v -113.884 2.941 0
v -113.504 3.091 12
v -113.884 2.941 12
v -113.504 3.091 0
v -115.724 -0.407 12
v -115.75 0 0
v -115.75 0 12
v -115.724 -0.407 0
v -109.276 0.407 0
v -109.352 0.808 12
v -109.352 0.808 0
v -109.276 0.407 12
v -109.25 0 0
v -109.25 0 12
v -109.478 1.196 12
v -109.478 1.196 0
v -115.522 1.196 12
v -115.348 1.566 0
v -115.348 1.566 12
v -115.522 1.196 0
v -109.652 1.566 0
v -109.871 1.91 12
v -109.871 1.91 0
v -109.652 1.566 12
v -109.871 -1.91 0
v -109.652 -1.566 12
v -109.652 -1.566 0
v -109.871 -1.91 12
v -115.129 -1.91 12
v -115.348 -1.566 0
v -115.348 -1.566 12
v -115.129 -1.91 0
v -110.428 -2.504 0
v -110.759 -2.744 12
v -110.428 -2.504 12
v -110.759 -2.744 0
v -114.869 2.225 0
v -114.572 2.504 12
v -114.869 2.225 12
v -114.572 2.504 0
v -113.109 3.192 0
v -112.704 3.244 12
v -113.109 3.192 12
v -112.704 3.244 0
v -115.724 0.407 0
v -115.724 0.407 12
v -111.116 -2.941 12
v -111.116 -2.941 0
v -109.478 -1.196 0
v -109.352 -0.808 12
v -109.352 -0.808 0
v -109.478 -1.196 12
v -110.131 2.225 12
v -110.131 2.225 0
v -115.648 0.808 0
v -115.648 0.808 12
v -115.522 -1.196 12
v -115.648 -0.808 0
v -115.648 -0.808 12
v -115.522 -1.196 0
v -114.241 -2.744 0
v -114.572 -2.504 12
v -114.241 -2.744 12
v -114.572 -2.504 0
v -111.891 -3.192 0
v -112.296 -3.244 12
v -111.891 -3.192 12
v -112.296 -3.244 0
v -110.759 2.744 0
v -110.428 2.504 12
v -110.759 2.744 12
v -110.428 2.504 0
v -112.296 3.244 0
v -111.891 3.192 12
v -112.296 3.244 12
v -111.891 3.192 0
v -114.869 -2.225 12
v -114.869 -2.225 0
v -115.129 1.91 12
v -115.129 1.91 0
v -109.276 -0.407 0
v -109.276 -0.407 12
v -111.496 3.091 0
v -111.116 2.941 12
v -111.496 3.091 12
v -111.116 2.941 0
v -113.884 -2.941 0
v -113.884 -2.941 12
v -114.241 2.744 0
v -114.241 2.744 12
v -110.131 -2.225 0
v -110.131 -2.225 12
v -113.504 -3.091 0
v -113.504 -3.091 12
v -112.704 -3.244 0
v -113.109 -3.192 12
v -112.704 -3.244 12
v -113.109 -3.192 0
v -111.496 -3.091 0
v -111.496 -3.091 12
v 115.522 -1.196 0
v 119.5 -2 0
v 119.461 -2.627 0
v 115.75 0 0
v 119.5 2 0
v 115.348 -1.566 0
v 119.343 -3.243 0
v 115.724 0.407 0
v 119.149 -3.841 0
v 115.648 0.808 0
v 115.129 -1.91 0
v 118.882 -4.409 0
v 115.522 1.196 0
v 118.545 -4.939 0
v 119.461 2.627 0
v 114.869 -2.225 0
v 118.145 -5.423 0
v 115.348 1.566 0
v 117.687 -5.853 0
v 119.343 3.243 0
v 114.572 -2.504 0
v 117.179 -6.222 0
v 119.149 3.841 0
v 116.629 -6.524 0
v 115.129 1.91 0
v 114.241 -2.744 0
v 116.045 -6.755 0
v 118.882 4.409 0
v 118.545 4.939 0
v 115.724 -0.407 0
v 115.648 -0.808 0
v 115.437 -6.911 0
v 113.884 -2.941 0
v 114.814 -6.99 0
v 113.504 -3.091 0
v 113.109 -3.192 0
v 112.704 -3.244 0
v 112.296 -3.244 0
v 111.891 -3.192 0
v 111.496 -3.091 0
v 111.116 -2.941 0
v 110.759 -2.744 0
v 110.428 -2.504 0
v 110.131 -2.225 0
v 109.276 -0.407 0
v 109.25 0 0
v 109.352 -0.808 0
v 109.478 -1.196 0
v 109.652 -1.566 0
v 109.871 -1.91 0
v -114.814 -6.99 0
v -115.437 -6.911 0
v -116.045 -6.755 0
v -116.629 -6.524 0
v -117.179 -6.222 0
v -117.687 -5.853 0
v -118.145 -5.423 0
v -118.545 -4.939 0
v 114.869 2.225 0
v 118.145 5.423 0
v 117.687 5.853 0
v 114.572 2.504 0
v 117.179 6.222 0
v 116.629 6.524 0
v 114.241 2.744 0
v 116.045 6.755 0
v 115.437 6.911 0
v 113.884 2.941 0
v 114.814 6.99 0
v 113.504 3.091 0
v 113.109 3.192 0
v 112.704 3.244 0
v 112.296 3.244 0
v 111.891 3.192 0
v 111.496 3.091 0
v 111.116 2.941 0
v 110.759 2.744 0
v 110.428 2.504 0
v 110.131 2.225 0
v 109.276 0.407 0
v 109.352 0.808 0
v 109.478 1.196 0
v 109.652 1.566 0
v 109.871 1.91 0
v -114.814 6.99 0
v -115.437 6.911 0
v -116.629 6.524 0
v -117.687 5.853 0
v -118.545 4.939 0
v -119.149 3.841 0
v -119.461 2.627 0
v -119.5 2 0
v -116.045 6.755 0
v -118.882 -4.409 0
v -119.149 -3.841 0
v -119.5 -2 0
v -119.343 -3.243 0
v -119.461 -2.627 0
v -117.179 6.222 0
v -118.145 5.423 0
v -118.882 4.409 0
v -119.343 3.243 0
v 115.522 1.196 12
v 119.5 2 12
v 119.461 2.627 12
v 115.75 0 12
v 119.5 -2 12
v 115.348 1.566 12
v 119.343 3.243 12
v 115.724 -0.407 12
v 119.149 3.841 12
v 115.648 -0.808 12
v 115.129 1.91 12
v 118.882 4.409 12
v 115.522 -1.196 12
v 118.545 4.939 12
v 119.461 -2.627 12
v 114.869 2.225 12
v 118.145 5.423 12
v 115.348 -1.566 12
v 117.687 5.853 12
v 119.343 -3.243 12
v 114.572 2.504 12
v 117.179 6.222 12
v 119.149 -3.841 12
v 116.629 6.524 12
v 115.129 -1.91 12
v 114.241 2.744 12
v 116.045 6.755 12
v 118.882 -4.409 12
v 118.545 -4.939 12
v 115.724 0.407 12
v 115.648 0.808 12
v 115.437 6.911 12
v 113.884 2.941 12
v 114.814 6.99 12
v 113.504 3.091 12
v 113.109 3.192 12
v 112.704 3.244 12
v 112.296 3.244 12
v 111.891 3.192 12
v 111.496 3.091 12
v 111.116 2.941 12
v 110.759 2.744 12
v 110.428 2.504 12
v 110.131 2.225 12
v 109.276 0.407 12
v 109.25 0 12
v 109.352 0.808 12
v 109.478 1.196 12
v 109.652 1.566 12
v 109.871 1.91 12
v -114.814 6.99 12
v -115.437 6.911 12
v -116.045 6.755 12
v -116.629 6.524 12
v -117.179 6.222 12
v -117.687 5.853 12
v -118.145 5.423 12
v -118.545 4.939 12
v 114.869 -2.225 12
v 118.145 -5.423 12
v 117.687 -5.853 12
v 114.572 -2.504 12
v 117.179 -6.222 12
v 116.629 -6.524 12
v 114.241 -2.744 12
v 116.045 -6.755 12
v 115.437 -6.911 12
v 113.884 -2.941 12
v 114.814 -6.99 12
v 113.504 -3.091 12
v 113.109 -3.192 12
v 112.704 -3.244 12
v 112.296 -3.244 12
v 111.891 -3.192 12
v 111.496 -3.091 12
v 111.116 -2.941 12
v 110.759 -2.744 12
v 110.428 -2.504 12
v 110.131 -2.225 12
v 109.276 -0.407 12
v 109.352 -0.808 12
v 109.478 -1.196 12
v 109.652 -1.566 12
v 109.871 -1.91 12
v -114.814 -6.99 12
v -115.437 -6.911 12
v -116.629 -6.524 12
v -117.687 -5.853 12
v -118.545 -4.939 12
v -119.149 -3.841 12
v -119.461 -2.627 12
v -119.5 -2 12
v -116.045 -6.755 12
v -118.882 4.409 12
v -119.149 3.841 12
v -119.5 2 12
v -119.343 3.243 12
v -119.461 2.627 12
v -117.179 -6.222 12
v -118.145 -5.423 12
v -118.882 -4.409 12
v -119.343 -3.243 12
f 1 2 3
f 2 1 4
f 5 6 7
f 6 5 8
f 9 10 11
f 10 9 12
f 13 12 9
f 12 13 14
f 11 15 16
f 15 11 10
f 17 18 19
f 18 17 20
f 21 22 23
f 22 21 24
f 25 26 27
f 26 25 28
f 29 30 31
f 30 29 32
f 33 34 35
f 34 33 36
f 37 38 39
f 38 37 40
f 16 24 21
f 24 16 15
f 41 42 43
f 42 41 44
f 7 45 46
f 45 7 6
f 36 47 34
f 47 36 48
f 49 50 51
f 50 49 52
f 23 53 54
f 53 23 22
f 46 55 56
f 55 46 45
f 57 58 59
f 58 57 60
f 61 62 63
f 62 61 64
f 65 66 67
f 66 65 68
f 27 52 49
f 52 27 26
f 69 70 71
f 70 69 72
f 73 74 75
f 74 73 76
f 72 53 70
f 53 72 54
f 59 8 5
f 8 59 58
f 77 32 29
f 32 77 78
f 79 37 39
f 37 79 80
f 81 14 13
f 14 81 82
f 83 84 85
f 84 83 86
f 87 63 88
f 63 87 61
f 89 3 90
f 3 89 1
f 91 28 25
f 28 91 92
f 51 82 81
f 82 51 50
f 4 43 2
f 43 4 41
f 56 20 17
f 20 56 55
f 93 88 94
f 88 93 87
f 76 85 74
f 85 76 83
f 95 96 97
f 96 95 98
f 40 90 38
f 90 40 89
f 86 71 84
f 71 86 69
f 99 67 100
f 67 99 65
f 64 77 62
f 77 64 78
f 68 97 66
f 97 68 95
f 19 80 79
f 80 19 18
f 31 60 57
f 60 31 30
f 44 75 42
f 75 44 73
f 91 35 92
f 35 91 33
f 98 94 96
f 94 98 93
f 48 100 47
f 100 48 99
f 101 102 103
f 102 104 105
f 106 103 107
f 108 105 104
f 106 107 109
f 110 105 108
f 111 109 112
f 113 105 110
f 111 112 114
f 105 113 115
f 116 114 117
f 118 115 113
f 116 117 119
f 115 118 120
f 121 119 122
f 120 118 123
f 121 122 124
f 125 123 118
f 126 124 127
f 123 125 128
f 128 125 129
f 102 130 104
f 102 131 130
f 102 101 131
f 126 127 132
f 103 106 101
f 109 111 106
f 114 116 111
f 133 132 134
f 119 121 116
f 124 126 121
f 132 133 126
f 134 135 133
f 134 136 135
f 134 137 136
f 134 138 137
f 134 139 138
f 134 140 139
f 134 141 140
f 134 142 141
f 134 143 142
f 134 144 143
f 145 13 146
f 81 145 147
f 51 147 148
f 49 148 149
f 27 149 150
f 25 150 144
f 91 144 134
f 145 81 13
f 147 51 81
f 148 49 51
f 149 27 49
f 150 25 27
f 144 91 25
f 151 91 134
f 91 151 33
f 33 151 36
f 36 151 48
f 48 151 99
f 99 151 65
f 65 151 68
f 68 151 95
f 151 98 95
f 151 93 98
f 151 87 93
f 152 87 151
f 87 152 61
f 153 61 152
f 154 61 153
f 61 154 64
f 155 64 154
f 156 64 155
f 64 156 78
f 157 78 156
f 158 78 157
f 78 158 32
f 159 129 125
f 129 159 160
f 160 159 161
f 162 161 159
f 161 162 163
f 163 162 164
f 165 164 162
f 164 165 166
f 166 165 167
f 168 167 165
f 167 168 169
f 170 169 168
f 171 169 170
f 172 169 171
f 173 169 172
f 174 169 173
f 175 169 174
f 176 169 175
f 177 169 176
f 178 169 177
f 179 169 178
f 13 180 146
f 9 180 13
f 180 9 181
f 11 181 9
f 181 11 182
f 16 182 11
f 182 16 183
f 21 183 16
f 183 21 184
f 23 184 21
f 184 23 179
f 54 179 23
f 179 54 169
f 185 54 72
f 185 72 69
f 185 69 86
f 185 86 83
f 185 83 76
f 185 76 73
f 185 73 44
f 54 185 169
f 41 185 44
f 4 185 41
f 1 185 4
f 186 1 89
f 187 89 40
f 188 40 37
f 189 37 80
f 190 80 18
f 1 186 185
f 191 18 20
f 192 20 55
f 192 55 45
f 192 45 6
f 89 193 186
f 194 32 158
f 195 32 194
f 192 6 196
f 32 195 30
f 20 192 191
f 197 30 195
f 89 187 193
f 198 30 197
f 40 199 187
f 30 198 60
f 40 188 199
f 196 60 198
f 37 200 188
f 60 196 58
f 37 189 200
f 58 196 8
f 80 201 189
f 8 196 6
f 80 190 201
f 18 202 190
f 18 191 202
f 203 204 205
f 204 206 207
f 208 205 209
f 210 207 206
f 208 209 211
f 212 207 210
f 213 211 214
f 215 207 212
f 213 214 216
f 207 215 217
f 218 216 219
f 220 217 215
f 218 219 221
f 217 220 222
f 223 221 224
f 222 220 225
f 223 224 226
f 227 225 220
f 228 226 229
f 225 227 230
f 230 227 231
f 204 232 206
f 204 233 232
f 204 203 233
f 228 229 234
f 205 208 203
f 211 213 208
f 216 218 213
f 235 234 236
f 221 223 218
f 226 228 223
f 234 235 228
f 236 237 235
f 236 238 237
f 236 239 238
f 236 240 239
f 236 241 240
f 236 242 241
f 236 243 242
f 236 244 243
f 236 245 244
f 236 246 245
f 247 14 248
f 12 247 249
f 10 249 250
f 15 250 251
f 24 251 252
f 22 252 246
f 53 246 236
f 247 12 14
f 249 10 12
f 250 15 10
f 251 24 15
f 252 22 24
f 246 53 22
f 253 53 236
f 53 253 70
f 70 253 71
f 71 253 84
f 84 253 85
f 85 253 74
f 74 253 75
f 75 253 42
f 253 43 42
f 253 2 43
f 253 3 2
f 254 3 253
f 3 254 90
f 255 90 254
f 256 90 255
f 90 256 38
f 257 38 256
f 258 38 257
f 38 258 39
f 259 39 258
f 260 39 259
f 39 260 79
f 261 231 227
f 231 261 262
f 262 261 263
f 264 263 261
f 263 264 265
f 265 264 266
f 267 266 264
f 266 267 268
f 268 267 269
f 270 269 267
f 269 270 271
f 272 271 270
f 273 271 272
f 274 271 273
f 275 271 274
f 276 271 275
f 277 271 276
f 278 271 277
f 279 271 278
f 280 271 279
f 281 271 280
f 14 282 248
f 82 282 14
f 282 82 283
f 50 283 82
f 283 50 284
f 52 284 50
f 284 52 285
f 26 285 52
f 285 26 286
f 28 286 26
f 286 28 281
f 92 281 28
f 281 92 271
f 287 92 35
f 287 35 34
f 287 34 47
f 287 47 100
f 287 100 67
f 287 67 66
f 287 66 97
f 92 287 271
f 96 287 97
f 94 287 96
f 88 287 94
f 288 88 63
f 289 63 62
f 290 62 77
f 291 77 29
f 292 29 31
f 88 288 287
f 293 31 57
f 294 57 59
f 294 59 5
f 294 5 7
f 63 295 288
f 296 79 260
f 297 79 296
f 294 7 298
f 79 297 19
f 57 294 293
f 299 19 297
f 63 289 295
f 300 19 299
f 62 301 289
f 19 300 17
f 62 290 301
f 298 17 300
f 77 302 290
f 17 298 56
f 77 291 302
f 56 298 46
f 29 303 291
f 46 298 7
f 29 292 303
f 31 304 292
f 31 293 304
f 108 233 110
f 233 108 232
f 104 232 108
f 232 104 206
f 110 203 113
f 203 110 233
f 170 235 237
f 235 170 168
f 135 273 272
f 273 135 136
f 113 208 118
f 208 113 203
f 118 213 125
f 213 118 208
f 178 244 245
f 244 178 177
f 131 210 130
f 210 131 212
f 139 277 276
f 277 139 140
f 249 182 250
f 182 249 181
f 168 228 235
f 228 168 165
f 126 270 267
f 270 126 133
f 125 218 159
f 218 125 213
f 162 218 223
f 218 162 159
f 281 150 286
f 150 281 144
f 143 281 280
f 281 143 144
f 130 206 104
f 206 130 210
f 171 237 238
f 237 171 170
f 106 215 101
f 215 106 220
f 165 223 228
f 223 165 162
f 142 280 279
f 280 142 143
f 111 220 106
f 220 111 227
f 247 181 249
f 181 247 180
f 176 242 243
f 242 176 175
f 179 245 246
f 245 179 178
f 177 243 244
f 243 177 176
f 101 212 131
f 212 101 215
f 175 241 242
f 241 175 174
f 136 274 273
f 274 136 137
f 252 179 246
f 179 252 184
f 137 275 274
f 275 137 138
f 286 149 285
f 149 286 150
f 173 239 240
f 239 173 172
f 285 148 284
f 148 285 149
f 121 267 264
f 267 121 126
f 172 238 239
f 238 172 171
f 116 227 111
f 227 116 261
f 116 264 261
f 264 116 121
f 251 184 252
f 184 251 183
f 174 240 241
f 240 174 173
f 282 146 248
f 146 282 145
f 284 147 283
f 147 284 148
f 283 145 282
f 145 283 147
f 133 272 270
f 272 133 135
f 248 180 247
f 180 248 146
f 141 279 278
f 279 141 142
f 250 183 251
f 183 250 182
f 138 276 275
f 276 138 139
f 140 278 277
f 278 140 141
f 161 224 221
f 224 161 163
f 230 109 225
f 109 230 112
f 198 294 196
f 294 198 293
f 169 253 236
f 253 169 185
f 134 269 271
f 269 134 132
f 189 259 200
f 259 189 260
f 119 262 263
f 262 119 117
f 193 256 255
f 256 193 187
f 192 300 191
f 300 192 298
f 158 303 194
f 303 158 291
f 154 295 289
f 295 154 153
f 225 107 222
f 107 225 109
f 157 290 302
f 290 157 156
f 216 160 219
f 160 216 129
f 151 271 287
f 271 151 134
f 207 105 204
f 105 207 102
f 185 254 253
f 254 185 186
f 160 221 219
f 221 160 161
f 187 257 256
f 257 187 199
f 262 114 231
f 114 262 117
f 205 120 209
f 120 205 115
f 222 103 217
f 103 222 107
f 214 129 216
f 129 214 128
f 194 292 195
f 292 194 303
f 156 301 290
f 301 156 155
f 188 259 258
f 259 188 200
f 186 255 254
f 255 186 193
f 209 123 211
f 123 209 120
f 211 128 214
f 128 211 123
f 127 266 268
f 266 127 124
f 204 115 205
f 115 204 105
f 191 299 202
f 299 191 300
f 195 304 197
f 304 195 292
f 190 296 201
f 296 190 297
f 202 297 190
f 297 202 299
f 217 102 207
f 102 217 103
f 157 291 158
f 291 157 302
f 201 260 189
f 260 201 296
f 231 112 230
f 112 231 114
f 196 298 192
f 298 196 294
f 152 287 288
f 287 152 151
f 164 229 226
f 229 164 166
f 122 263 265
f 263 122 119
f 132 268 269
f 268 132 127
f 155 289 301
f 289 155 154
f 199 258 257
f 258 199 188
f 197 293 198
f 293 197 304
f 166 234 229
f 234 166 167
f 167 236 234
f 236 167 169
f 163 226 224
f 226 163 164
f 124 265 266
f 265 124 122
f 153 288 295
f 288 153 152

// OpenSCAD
$fn = 50;


difference() {
	union() {
		hull() {
			translate(v = [-114.5000000000, 2.0000000000, 0]) {
				cylinder(h = 12, r = 5);
			}
			translate(v = [114.5000000000, 2.0000000000, 0]) {
				cylinder(h = 12, r = 5);
			}
			translate(v = [-114.5000000000, -2.0000000000, 0]) {
				cylinder(h = 12, r = 5);
			}
			translate(v = [114.5000000000, -2.0000000000, 0]) {
				cylinder(h = 12, r = 5);
			}
		}
	}
	union() {
		translate(v = [-112.5000000000, 0.0000000000, 0]) {
			cylinder(h = 12, r = 3.2500000000);
		}
		translate(v = [112.5000000000, 0.0000000000, 0]) {
			cylinder(h = 12, r = 3.2500000000);
		}
		translate(v = [-112.5000000000, 0.0000000000, 0]) {
			cylinder(h = 12, r = 1.8000000000);
		}
		translate(v = [112.5000000000, 0.0000000000, 0]) {
			cylinder(h = 12, r = 1.8000000000);
		}
		translate(v = [-112.5000000000, 0.0000000000, 0]) {
			cylinder(h = 12, r = 1.8000000000);
		}
		translate(v = [112.5000000000, 0.0000000000, 0]) {
			cylinder(h = 12, r = 1.8000000000);
		}
		translate(v = [-112.5000000000, 0.0000000000, 0]) {
			cylinder(h = 12, r = 1.8000000000);
		}
		translate(v = [112.5000000000, 0.0000000000, 0]) {
			cylinder(h = 12, r = 1.8000000000);
		}
	}
}
